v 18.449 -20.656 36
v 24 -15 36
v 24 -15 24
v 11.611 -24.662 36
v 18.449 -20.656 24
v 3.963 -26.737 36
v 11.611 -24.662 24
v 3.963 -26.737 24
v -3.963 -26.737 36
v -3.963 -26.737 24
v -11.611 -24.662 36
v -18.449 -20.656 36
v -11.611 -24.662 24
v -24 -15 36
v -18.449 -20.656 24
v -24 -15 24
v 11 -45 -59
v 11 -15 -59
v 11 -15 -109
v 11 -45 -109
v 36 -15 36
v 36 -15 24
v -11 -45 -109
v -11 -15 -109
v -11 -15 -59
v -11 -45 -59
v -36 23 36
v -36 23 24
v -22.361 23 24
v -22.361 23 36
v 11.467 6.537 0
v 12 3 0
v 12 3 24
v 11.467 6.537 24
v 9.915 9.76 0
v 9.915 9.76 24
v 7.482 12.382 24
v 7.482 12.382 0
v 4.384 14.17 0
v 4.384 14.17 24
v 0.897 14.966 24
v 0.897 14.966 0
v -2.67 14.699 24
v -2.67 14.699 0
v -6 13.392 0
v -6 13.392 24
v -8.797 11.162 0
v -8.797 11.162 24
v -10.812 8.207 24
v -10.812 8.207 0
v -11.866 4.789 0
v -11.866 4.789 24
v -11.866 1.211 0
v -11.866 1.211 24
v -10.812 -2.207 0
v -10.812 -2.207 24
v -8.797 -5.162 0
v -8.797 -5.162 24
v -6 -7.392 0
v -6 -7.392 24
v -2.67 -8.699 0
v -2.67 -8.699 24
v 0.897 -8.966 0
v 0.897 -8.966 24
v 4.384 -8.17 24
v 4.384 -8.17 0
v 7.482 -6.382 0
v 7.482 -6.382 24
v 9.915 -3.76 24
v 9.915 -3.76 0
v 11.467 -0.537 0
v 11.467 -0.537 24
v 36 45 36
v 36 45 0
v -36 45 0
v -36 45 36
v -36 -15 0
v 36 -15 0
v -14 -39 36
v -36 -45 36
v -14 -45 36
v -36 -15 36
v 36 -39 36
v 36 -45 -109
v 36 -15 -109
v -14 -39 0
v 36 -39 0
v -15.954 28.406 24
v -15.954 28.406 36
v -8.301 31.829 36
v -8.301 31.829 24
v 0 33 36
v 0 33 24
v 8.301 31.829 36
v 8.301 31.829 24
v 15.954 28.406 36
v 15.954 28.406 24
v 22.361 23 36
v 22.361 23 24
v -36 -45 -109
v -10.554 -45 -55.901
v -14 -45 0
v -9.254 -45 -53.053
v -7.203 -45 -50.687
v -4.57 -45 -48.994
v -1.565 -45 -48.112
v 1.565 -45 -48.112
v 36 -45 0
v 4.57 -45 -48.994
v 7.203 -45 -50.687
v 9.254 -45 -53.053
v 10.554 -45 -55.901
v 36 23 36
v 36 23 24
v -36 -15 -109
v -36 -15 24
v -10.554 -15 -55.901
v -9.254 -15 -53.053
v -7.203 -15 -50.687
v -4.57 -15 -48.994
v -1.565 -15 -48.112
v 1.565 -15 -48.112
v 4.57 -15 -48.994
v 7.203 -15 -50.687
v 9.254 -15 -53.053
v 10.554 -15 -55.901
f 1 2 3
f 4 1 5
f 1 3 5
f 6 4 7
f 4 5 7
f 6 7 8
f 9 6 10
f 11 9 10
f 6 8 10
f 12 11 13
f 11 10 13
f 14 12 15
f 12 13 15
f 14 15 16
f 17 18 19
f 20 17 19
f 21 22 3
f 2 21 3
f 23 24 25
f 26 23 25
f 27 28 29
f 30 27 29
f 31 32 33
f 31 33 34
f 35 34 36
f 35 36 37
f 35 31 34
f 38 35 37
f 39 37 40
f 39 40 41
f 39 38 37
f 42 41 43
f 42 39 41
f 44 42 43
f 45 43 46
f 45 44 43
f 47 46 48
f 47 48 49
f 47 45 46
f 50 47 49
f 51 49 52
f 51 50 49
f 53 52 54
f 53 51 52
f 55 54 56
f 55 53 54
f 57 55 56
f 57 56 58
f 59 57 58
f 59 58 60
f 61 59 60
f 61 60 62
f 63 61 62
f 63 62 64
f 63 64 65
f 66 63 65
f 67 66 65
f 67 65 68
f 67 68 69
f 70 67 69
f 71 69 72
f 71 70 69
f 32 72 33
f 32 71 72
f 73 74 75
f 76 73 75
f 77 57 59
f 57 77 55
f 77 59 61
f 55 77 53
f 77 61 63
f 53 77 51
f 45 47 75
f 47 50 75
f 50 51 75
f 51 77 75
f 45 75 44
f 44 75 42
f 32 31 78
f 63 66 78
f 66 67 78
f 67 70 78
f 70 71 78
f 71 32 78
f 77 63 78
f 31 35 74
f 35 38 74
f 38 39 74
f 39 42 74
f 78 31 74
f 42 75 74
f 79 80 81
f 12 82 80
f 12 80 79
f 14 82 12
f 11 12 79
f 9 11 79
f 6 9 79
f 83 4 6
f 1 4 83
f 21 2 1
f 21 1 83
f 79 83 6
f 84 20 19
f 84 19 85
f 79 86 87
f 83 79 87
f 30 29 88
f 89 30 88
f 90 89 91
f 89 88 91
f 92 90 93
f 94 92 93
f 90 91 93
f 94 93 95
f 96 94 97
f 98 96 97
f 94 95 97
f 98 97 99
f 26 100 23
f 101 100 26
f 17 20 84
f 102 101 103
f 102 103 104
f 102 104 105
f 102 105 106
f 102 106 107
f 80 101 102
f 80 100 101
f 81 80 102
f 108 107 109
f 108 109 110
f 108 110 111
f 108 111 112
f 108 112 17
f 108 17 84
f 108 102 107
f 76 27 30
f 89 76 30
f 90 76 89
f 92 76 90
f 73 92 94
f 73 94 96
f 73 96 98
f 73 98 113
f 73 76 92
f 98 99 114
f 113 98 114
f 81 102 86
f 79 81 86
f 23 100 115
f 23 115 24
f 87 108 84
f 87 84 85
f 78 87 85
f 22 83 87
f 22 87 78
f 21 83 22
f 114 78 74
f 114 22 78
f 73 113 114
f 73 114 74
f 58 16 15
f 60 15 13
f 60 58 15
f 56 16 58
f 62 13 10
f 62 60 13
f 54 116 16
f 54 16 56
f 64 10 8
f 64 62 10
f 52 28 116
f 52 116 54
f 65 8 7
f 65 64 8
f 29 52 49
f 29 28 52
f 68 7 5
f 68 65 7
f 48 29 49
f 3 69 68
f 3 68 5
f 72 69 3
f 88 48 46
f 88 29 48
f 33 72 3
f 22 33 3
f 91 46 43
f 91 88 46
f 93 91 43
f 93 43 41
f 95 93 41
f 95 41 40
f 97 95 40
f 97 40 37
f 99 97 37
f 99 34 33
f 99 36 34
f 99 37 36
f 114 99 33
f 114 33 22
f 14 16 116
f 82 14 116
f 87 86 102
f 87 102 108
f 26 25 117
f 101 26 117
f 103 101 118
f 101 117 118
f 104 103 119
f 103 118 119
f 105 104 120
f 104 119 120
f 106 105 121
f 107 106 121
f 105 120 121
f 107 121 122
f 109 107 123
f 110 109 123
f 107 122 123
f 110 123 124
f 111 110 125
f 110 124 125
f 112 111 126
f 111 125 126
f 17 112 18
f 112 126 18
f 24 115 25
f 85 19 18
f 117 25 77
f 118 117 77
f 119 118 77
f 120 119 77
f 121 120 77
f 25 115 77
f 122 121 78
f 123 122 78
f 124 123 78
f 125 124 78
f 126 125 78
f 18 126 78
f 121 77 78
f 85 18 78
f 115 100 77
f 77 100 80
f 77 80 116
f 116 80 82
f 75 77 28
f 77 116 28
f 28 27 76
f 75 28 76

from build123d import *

# Parameters (mm, degrees)
SKETCH1_R           = 12
BOSS_EXTRUDE1_DEPTH = 24
BOSS_EXTRUDE2_DEPTH = 36
SKETCH1_9_W         = 72
SKETCH1_9_H         = 30
BOSS_EXTRUDE5_DEPTH = 109
SKETCH1_10_W        = 50
SKETCH1_10_H        = 6
BOSS_EXTRUDE6_DEPTH = 36
CUT_EXTRUDE1_DEPTH  = 30


with BuildPart() as part:
    # Sketch1 → Boss-Extrude1 (new body)
    # profile 1 of 5: a face of its own
    with BuildSketch(Plane.XY):
        with BuildLine():
            Line((22.360679775, 23), (-22.360679775, 23))
            ThreePointArc((-22.360679775, 23), (-29.972123003, 4.292997564), (-24, -15))
            Line((-24, -15), (24, -15))
            ThreePointArc((24, -15), (28.460498942, -6.486832981), (30, 3))
            ThreePointArc((30, 3), (28.025170769, 13.704662693), (22.360679775, 23))
        make_face()
        with Locations((0, 3)):
            Circle(SKETCH1_R, mode=Mode.SUBTRACT)
    # profile 2 of 5: a face of its own
    with BuildSketch(Plane.XY):
        with BuildLine():
            ThreePointArc((22.360679775, 23), (0, 33), (-22.360679775, 23))
            Line((-22.360679775, 23), (22.360679775, 23))
        make_face()
    # profile 3 of 5: a face of its own
    with BuildSketch(Plane.XY):
        with BuildLine():
            Line((24, -15), (-24, -15))
            ThreePointArc((-24, -15), (0, -27), (24, -15))
        make_face()
    # profile 4 of 5: a face of its own
    with BuildSketch(Plane.XY):
        with BuildLine():
            Line((36, -15), (36, 23))
            Line((36, 23), (22.360679775, 23))
            ThreePointArc((22.360679775, 23), (28.025170769, 13.704662693), (30, 3))
            ThreePointArc((30, 3), (28.460498942, -6.486832981), (24, -15))
            Line((24, -15), (36, -15))
        make_face()
    # profile 5 of 5: a face of its own
    with BuildSketch(Plane.XY):
        with BuildLine():
            Line((-22.360679775, 23), (-36, 23))
            Line((-36, 23), (-36, -15))
            Line((-36, -15), (-24, -15))
            ThreePointArc((-24, -15), (-29.972123003, 4.292997564), (-22.360679775, 23))
        make_face()
    extrude(amount=BOSS_EXTRUDE1_DEPTH)

    # Sketch1<4> → Boss-Extrude2 (add)
    with BuildSketch(Plane.XY):
        with BuildLine():
            Line((36, 45), (-36, 45))
            Line((-36, 45), (-36, 23))
            Line((-36, 23), (-22.360679775, 23))
            ThreePointArc((-22.360679775, 23), (0, 33), (22.360679775, 23))
            Line((22.360679775, 23), (36, 23))
            Line((36, 23), (36, 45))
        make_face()
        with BuildLine():
            Line((-24, -15), (-36, -15))
            Line((-36, -15), (-36, -45))
            Line((-36, -45), (-14, -45))
            Line((-14, -45), (-14, -39))
            Line((-14, -39), (36, -39))
            Line((36, -39), (36, -15))
            Line((36, -15), (24, -15))
            ThreePointArc((24, -15), (0, -27), (-24, -15))
        make_face()
    extrude(amount=BOSS_EXTRUDE2_DEPTH)

    # Sketch1<9> → Boss-Extrude5 (add)
    with BuildSketch(Plane.XY):
        with Locations((0, -30)):
            Rectangle(SKETCH1_9_W, SKETCH1_9_H)
    extrude(amount=-BOSS_EXTRUDE5_DEPTH)

    # Sketch1<10> → Boss-Extrude6 (add)
    with BuildSketch(Plane.XY):
        with Locations((11, -42)):
            Rectangle(SKETCH1_10_W, SKETCH1_10_H)
    extrude(amount=-BOSS_EXTRUDE6_DEPTH)

    # Sketch3 → Cut-Extrude1 (cut)
    with BuildSketch(Plane(origin=(0, -15, 0), x_dir=(1, 0, 0), z_dir=(0, 1, 0))):
        with BuildLine():
            Line((11, 59), (11, 109))
            Line((11, 109), (-11, 109))
            Line((-11, 109), (-11, 59))
            ThreePointArc((-11, 59), (0, 70), (11, 59))
        make_face()
        with BuildLine():
            ThreePointArc((-11, 59), (0, 48), (11, 59))
            Line((11, 59), (-11, 59))
        make_face()
        with BuildLine():
            Line((-11, 59), (11, 59))
            ThreePointArc((11, 59), (0, 70), (-11, 59))
        make_face()
    extrude(amount=-CUT_EXTRUDE1_DEPTH, mode=Mode.SUBTRACT)


solid = part.part
